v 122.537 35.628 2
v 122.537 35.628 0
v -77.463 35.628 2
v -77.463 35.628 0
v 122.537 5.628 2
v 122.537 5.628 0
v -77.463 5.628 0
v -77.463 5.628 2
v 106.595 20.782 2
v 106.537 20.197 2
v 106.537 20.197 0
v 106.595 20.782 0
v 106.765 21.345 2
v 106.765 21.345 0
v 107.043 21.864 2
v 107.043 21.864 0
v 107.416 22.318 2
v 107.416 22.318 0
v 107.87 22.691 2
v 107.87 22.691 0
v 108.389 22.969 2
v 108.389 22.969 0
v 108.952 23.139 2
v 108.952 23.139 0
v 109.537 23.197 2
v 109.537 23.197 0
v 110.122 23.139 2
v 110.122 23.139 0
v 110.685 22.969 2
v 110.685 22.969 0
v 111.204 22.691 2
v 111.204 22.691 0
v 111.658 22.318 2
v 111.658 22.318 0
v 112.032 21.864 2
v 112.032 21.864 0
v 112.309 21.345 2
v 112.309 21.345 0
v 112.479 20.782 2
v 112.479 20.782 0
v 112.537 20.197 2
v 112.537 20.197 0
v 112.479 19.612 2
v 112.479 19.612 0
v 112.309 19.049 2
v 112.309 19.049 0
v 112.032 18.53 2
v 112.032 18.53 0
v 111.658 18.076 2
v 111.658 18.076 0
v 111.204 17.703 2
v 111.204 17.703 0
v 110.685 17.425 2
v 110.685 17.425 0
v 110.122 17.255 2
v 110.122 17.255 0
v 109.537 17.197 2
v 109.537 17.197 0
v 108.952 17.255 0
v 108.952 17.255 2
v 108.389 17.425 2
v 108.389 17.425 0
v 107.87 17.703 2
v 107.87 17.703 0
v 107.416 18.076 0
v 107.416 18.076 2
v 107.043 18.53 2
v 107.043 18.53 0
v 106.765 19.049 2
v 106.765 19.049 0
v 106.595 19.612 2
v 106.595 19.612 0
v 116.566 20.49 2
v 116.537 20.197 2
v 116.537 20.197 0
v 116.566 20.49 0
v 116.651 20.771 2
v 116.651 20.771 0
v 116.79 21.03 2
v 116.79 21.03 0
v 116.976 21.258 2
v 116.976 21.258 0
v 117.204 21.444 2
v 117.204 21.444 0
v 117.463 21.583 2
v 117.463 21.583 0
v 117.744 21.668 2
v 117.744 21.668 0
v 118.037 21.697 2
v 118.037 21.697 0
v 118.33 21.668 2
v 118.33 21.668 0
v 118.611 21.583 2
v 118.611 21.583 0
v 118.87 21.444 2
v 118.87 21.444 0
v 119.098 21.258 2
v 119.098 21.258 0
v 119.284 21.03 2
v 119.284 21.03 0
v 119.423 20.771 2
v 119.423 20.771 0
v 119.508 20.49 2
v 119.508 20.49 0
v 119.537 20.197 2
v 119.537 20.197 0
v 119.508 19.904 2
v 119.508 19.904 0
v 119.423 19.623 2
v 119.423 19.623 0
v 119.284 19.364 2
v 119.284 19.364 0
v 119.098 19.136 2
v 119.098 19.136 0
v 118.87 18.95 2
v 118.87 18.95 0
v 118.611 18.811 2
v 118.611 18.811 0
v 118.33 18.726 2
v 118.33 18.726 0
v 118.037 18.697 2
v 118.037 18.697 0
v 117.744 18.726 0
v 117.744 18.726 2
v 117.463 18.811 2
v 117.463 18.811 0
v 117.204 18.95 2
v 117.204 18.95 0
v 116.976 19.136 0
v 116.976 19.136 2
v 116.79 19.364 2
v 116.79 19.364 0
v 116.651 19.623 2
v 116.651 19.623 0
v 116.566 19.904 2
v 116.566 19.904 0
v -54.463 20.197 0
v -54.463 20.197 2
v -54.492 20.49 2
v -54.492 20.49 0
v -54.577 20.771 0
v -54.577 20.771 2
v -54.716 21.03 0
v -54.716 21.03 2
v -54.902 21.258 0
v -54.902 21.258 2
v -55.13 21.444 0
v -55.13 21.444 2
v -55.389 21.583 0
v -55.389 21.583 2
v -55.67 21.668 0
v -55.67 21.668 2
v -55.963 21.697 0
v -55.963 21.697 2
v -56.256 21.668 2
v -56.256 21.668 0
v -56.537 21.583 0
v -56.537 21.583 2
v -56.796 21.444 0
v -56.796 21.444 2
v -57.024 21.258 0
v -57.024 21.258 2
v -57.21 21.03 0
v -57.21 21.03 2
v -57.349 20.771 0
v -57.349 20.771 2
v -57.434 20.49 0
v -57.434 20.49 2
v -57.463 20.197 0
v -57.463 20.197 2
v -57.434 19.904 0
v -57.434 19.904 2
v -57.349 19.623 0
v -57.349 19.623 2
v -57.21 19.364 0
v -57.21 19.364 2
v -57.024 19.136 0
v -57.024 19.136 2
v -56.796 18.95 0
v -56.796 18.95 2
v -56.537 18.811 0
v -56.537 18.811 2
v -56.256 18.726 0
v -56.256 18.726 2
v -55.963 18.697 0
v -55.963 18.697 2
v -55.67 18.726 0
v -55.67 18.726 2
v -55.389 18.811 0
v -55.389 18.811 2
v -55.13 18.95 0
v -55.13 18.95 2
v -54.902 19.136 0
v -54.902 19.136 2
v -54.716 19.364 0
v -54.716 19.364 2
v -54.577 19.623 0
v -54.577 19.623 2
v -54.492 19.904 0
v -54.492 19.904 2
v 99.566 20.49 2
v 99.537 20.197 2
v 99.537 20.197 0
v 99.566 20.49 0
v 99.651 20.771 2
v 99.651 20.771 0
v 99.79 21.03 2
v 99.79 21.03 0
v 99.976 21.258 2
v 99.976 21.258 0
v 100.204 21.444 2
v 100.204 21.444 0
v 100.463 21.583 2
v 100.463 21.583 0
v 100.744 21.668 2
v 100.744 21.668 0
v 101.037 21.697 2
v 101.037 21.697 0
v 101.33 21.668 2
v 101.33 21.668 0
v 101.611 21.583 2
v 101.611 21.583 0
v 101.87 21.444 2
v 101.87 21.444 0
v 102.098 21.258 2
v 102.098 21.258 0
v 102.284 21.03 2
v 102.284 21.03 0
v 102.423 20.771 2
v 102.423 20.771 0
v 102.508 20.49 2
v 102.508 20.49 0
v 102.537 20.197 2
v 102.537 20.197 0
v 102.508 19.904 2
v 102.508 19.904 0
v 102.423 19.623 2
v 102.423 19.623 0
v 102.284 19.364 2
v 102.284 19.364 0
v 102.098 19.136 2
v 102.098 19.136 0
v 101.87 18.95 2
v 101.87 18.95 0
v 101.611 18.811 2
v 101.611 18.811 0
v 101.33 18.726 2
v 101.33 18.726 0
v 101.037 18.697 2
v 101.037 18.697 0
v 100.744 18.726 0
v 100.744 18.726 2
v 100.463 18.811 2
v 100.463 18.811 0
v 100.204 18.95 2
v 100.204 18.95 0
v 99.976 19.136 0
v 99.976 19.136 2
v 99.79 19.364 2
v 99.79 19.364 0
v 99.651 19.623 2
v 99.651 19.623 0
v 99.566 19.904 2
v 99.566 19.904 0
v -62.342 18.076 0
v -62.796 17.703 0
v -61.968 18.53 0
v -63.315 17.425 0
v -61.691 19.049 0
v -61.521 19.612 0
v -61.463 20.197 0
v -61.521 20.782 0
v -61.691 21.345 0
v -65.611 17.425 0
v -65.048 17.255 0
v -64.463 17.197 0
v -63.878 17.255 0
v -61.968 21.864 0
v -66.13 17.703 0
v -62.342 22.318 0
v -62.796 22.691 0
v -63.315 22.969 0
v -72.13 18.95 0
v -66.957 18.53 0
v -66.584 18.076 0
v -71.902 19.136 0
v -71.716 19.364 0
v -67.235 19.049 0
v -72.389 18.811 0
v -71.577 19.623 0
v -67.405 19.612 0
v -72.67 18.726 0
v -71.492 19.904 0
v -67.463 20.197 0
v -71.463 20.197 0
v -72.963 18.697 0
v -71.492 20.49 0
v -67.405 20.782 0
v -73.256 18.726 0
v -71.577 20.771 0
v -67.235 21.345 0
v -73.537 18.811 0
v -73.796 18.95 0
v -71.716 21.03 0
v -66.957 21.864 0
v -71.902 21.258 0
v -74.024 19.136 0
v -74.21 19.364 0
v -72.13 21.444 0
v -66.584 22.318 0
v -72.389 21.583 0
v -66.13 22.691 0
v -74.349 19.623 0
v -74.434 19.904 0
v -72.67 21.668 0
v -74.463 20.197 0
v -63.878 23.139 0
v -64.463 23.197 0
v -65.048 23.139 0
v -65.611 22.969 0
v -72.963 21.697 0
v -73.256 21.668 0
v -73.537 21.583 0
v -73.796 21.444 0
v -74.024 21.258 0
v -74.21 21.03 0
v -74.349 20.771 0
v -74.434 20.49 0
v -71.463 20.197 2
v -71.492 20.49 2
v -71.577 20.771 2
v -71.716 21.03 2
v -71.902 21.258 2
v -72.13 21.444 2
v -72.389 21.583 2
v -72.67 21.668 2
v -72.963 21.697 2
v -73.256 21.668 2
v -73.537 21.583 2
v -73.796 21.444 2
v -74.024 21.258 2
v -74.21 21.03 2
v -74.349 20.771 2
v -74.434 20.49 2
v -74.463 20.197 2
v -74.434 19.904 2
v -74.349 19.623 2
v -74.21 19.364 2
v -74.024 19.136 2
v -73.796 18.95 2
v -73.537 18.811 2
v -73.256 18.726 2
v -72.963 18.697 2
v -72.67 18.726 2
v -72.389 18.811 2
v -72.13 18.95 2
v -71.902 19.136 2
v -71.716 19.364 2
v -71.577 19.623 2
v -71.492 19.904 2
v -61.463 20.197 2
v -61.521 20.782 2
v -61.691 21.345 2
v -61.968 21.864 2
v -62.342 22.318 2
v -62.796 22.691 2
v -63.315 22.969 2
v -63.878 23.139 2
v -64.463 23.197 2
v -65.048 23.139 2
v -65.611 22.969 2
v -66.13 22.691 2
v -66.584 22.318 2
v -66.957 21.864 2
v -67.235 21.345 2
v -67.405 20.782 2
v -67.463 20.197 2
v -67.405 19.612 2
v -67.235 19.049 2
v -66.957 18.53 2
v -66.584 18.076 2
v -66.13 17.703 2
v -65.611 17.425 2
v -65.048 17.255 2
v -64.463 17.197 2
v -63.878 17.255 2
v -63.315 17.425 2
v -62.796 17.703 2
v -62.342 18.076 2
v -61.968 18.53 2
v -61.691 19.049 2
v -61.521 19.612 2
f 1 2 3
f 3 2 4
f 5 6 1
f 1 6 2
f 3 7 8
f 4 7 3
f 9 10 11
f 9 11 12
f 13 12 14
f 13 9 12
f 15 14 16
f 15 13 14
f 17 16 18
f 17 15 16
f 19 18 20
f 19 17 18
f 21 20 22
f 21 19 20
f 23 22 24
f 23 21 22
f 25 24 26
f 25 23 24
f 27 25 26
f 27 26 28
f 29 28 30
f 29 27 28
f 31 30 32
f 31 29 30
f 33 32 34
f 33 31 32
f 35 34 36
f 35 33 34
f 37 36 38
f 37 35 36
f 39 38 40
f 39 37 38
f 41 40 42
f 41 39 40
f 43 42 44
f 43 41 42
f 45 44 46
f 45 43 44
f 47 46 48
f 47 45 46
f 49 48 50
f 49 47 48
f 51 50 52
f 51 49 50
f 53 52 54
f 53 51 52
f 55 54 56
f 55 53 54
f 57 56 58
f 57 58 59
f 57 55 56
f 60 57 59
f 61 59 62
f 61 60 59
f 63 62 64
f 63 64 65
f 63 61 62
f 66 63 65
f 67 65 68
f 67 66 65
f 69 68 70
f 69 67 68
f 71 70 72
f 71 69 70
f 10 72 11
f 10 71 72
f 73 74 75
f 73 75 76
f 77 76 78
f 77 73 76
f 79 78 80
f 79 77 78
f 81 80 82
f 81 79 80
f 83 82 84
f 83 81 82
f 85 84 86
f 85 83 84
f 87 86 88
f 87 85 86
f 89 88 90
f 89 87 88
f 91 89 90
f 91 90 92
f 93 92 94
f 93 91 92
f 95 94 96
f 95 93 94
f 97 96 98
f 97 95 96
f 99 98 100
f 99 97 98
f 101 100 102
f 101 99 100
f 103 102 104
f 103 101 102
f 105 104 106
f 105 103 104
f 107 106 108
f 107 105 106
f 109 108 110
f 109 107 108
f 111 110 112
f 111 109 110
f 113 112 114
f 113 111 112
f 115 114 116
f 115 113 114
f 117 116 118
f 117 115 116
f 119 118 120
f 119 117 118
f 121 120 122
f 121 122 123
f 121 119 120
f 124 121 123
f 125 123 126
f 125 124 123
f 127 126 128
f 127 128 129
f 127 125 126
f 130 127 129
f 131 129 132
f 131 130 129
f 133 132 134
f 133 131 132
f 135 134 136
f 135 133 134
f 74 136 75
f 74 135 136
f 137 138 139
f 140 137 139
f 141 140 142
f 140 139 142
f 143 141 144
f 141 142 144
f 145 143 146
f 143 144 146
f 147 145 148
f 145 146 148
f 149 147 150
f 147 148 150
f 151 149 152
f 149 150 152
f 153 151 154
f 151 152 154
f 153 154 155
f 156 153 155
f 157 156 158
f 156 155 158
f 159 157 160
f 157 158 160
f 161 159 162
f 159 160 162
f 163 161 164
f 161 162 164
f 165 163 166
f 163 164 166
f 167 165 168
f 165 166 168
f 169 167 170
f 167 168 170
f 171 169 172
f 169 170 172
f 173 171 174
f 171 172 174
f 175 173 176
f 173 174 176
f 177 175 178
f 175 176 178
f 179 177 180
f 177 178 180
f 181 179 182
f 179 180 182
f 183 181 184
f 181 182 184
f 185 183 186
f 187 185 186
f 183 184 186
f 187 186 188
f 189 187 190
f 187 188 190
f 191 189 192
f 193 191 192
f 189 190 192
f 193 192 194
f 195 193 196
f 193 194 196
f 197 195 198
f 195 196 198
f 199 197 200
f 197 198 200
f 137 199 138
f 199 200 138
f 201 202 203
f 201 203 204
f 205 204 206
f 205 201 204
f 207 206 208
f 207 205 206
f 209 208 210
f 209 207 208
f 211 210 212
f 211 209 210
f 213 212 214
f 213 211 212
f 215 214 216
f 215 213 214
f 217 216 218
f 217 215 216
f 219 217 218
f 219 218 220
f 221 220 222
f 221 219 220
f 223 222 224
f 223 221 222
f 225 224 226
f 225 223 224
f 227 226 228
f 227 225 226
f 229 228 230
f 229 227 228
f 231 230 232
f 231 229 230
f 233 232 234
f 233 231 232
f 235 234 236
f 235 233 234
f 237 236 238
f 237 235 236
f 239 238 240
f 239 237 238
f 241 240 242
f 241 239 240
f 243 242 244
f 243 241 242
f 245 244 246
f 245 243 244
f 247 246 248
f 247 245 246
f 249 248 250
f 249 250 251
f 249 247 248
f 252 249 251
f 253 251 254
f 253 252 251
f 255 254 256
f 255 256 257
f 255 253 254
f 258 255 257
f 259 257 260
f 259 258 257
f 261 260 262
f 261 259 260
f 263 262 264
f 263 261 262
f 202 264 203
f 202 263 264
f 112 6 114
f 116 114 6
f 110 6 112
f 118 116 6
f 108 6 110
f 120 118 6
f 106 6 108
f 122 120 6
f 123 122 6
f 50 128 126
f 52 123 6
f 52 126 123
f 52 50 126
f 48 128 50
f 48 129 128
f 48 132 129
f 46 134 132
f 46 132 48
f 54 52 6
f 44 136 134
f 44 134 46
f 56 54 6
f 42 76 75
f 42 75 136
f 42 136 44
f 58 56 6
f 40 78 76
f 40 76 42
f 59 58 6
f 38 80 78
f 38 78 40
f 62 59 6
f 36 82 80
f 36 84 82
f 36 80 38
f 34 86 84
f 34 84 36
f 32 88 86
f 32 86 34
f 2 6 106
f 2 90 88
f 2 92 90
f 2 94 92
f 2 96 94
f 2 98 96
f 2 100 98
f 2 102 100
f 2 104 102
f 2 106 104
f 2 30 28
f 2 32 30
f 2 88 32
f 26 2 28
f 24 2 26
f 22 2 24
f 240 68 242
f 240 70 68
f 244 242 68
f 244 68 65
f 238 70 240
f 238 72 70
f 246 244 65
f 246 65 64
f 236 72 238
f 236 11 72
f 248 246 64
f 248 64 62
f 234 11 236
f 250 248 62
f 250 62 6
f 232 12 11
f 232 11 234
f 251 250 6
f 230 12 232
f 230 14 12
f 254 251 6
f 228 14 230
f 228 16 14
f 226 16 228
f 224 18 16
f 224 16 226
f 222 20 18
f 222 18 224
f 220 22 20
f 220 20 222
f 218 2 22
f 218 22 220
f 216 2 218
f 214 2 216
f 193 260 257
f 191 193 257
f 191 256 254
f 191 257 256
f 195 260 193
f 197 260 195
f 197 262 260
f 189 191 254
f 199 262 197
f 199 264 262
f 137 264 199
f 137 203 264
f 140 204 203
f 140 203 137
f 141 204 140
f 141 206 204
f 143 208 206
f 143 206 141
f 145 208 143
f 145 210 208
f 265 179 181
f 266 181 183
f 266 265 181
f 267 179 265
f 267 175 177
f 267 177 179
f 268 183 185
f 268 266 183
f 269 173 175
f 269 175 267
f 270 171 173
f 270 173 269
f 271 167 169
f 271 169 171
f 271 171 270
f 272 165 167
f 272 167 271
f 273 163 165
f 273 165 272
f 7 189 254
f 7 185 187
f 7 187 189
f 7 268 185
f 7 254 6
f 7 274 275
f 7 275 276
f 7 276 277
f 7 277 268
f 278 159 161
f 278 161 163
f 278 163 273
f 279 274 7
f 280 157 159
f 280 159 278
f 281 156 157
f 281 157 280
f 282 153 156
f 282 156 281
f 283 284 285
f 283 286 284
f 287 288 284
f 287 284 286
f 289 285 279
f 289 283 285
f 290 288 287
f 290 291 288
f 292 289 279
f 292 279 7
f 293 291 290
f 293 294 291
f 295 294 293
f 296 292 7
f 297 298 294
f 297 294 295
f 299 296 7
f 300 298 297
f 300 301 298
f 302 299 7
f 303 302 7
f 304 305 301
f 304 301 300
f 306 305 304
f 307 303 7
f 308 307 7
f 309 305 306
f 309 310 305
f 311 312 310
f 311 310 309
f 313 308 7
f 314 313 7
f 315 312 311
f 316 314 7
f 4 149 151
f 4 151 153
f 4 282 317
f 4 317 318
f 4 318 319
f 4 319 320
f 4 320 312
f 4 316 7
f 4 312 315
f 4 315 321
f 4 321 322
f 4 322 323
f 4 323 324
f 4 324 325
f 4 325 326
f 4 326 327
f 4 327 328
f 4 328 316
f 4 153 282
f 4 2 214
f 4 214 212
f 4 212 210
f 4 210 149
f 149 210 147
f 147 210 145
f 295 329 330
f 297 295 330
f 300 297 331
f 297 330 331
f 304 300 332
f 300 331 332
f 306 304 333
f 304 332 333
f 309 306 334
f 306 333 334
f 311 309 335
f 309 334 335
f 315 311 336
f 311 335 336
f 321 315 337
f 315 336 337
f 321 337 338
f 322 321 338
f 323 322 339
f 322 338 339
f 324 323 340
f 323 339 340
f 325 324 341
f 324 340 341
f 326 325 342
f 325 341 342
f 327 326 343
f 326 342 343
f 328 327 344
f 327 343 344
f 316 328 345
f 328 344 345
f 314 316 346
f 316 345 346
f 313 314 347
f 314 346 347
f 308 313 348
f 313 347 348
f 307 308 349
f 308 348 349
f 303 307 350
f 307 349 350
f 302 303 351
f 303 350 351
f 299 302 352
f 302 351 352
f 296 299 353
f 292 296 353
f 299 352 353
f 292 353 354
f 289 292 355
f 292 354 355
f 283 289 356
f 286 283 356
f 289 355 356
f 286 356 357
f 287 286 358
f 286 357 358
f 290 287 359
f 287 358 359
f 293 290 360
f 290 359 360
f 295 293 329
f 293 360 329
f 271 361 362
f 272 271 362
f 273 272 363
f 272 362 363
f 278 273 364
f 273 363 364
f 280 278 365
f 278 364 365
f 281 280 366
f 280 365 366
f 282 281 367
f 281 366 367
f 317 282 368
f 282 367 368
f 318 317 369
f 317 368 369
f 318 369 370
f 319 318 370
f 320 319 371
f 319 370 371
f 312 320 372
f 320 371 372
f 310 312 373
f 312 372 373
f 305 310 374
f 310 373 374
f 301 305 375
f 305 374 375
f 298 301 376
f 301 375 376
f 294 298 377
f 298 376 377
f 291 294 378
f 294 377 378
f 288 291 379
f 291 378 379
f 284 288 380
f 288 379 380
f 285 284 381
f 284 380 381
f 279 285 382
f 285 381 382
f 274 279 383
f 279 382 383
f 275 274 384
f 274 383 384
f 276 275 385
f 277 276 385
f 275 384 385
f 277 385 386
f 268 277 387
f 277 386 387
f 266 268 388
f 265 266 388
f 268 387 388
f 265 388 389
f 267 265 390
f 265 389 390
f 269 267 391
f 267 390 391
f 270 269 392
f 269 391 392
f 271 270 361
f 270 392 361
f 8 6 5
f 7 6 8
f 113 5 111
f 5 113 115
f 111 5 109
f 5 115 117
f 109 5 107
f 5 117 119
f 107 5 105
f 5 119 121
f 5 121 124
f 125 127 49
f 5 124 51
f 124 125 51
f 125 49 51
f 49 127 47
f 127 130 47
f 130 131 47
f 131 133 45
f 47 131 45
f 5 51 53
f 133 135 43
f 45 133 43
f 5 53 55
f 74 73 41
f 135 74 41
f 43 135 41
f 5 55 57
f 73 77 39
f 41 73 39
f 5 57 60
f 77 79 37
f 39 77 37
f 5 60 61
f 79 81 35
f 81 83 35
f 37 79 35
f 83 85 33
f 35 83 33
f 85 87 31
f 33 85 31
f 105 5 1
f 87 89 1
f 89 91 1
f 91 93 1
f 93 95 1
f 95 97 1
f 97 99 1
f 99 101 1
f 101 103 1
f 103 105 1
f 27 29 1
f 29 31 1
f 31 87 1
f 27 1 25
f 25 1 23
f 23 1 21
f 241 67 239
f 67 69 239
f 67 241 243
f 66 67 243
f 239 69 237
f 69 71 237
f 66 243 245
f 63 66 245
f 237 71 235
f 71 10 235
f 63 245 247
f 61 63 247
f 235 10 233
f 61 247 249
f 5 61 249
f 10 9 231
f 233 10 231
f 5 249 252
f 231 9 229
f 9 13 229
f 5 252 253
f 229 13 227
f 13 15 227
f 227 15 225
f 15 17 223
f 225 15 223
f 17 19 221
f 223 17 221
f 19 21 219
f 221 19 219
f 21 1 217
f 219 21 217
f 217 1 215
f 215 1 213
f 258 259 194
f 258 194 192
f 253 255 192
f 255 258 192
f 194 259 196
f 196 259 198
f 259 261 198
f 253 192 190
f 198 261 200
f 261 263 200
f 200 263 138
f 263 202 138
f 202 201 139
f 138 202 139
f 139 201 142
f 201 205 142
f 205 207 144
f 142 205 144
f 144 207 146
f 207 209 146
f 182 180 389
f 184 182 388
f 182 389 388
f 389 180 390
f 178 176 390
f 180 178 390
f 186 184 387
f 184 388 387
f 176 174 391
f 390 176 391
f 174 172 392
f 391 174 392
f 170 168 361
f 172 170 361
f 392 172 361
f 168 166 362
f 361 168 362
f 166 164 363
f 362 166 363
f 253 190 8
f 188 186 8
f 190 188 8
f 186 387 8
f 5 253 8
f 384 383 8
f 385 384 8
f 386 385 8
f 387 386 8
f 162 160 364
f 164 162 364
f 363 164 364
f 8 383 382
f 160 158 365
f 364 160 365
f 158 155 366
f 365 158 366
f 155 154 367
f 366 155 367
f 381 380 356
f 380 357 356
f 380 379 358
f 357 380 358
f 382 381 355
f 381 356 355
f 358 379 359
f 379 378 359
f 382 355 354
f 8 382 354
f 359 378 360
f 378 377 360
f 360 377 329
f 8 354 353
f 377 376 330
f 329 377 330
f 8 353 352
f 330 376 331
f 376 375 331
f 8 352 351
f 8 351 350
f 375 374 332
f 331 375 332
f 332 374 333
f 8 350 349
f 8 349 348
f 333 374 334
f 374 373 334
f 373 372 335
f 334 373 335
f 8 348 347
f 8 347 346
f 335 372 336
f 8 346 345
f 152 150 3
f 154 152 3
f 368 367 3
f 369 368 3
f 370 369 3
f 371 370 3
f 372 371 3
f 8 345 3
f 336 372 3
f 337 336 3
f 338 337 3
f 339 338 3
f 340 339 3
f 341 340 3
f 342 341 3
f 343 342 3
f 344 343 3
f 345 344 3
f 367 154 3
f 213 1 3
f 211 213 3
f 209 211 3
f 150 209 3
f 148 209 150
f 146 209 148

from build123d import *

# Parameters (mm, degrees)
SKETCH1_W           = 100
SKETCH1_H           = 30
BOSS_EXTRUDE1_DEPTH = 2
SKETCH2_R           = 3
SKETCH2_R_2         = 1.5
CUT_EXTRUDE2_DEPTH  = 2


with BuildPart() as part:
    # Sketch1 → Boss-Extrude1 (new body)
    with BuildSketch(Plane.XY):
        with Locations((-27.462887989, 20.627530364)):
            Rectangle(SKETCH1_W, SKETCH1_H)
    boss_extrude1 = extrude(amount=BOSS_EXTRUDE1_DEPTH)

    # Sketch2 → Cut-Extrude2 (cut)
    with BuildSketch(Plane.XY.offset(2)):
        with Locations((-64.462887989, 20.196984479)):
            Circle(SKETCH2_R)
        with Locations((-72.962887989, 20.196984479)):
            Circle(SKETCH2_R_2)
        with Locations((-55.962887989, 20.196984479)):
            Circle(SKETCH2_R_2)
    cut_extrude2 = extrude(amount=-CUT_EXTRUDE2_DEPTH, mode=Mode.SUBTRACT)

    # Mirror2: Boss-Extrude1, Cut-Extrude2 across plane
    add(boss_extrude1.mirror(Plane(origin=(22.537112011, 35.627530364, 2), x_dir=(0, 0, 1), z_dir=(-1, 0, 0))))
    add(cut_extrude2.mirror(Plane(origin=(22.537112011, 35.627530364, 2), x_dir=(0, 0, 1), z_dir=(-1, 0, 0))), mode=Mode.SUBTRACT)


solid = part.part
